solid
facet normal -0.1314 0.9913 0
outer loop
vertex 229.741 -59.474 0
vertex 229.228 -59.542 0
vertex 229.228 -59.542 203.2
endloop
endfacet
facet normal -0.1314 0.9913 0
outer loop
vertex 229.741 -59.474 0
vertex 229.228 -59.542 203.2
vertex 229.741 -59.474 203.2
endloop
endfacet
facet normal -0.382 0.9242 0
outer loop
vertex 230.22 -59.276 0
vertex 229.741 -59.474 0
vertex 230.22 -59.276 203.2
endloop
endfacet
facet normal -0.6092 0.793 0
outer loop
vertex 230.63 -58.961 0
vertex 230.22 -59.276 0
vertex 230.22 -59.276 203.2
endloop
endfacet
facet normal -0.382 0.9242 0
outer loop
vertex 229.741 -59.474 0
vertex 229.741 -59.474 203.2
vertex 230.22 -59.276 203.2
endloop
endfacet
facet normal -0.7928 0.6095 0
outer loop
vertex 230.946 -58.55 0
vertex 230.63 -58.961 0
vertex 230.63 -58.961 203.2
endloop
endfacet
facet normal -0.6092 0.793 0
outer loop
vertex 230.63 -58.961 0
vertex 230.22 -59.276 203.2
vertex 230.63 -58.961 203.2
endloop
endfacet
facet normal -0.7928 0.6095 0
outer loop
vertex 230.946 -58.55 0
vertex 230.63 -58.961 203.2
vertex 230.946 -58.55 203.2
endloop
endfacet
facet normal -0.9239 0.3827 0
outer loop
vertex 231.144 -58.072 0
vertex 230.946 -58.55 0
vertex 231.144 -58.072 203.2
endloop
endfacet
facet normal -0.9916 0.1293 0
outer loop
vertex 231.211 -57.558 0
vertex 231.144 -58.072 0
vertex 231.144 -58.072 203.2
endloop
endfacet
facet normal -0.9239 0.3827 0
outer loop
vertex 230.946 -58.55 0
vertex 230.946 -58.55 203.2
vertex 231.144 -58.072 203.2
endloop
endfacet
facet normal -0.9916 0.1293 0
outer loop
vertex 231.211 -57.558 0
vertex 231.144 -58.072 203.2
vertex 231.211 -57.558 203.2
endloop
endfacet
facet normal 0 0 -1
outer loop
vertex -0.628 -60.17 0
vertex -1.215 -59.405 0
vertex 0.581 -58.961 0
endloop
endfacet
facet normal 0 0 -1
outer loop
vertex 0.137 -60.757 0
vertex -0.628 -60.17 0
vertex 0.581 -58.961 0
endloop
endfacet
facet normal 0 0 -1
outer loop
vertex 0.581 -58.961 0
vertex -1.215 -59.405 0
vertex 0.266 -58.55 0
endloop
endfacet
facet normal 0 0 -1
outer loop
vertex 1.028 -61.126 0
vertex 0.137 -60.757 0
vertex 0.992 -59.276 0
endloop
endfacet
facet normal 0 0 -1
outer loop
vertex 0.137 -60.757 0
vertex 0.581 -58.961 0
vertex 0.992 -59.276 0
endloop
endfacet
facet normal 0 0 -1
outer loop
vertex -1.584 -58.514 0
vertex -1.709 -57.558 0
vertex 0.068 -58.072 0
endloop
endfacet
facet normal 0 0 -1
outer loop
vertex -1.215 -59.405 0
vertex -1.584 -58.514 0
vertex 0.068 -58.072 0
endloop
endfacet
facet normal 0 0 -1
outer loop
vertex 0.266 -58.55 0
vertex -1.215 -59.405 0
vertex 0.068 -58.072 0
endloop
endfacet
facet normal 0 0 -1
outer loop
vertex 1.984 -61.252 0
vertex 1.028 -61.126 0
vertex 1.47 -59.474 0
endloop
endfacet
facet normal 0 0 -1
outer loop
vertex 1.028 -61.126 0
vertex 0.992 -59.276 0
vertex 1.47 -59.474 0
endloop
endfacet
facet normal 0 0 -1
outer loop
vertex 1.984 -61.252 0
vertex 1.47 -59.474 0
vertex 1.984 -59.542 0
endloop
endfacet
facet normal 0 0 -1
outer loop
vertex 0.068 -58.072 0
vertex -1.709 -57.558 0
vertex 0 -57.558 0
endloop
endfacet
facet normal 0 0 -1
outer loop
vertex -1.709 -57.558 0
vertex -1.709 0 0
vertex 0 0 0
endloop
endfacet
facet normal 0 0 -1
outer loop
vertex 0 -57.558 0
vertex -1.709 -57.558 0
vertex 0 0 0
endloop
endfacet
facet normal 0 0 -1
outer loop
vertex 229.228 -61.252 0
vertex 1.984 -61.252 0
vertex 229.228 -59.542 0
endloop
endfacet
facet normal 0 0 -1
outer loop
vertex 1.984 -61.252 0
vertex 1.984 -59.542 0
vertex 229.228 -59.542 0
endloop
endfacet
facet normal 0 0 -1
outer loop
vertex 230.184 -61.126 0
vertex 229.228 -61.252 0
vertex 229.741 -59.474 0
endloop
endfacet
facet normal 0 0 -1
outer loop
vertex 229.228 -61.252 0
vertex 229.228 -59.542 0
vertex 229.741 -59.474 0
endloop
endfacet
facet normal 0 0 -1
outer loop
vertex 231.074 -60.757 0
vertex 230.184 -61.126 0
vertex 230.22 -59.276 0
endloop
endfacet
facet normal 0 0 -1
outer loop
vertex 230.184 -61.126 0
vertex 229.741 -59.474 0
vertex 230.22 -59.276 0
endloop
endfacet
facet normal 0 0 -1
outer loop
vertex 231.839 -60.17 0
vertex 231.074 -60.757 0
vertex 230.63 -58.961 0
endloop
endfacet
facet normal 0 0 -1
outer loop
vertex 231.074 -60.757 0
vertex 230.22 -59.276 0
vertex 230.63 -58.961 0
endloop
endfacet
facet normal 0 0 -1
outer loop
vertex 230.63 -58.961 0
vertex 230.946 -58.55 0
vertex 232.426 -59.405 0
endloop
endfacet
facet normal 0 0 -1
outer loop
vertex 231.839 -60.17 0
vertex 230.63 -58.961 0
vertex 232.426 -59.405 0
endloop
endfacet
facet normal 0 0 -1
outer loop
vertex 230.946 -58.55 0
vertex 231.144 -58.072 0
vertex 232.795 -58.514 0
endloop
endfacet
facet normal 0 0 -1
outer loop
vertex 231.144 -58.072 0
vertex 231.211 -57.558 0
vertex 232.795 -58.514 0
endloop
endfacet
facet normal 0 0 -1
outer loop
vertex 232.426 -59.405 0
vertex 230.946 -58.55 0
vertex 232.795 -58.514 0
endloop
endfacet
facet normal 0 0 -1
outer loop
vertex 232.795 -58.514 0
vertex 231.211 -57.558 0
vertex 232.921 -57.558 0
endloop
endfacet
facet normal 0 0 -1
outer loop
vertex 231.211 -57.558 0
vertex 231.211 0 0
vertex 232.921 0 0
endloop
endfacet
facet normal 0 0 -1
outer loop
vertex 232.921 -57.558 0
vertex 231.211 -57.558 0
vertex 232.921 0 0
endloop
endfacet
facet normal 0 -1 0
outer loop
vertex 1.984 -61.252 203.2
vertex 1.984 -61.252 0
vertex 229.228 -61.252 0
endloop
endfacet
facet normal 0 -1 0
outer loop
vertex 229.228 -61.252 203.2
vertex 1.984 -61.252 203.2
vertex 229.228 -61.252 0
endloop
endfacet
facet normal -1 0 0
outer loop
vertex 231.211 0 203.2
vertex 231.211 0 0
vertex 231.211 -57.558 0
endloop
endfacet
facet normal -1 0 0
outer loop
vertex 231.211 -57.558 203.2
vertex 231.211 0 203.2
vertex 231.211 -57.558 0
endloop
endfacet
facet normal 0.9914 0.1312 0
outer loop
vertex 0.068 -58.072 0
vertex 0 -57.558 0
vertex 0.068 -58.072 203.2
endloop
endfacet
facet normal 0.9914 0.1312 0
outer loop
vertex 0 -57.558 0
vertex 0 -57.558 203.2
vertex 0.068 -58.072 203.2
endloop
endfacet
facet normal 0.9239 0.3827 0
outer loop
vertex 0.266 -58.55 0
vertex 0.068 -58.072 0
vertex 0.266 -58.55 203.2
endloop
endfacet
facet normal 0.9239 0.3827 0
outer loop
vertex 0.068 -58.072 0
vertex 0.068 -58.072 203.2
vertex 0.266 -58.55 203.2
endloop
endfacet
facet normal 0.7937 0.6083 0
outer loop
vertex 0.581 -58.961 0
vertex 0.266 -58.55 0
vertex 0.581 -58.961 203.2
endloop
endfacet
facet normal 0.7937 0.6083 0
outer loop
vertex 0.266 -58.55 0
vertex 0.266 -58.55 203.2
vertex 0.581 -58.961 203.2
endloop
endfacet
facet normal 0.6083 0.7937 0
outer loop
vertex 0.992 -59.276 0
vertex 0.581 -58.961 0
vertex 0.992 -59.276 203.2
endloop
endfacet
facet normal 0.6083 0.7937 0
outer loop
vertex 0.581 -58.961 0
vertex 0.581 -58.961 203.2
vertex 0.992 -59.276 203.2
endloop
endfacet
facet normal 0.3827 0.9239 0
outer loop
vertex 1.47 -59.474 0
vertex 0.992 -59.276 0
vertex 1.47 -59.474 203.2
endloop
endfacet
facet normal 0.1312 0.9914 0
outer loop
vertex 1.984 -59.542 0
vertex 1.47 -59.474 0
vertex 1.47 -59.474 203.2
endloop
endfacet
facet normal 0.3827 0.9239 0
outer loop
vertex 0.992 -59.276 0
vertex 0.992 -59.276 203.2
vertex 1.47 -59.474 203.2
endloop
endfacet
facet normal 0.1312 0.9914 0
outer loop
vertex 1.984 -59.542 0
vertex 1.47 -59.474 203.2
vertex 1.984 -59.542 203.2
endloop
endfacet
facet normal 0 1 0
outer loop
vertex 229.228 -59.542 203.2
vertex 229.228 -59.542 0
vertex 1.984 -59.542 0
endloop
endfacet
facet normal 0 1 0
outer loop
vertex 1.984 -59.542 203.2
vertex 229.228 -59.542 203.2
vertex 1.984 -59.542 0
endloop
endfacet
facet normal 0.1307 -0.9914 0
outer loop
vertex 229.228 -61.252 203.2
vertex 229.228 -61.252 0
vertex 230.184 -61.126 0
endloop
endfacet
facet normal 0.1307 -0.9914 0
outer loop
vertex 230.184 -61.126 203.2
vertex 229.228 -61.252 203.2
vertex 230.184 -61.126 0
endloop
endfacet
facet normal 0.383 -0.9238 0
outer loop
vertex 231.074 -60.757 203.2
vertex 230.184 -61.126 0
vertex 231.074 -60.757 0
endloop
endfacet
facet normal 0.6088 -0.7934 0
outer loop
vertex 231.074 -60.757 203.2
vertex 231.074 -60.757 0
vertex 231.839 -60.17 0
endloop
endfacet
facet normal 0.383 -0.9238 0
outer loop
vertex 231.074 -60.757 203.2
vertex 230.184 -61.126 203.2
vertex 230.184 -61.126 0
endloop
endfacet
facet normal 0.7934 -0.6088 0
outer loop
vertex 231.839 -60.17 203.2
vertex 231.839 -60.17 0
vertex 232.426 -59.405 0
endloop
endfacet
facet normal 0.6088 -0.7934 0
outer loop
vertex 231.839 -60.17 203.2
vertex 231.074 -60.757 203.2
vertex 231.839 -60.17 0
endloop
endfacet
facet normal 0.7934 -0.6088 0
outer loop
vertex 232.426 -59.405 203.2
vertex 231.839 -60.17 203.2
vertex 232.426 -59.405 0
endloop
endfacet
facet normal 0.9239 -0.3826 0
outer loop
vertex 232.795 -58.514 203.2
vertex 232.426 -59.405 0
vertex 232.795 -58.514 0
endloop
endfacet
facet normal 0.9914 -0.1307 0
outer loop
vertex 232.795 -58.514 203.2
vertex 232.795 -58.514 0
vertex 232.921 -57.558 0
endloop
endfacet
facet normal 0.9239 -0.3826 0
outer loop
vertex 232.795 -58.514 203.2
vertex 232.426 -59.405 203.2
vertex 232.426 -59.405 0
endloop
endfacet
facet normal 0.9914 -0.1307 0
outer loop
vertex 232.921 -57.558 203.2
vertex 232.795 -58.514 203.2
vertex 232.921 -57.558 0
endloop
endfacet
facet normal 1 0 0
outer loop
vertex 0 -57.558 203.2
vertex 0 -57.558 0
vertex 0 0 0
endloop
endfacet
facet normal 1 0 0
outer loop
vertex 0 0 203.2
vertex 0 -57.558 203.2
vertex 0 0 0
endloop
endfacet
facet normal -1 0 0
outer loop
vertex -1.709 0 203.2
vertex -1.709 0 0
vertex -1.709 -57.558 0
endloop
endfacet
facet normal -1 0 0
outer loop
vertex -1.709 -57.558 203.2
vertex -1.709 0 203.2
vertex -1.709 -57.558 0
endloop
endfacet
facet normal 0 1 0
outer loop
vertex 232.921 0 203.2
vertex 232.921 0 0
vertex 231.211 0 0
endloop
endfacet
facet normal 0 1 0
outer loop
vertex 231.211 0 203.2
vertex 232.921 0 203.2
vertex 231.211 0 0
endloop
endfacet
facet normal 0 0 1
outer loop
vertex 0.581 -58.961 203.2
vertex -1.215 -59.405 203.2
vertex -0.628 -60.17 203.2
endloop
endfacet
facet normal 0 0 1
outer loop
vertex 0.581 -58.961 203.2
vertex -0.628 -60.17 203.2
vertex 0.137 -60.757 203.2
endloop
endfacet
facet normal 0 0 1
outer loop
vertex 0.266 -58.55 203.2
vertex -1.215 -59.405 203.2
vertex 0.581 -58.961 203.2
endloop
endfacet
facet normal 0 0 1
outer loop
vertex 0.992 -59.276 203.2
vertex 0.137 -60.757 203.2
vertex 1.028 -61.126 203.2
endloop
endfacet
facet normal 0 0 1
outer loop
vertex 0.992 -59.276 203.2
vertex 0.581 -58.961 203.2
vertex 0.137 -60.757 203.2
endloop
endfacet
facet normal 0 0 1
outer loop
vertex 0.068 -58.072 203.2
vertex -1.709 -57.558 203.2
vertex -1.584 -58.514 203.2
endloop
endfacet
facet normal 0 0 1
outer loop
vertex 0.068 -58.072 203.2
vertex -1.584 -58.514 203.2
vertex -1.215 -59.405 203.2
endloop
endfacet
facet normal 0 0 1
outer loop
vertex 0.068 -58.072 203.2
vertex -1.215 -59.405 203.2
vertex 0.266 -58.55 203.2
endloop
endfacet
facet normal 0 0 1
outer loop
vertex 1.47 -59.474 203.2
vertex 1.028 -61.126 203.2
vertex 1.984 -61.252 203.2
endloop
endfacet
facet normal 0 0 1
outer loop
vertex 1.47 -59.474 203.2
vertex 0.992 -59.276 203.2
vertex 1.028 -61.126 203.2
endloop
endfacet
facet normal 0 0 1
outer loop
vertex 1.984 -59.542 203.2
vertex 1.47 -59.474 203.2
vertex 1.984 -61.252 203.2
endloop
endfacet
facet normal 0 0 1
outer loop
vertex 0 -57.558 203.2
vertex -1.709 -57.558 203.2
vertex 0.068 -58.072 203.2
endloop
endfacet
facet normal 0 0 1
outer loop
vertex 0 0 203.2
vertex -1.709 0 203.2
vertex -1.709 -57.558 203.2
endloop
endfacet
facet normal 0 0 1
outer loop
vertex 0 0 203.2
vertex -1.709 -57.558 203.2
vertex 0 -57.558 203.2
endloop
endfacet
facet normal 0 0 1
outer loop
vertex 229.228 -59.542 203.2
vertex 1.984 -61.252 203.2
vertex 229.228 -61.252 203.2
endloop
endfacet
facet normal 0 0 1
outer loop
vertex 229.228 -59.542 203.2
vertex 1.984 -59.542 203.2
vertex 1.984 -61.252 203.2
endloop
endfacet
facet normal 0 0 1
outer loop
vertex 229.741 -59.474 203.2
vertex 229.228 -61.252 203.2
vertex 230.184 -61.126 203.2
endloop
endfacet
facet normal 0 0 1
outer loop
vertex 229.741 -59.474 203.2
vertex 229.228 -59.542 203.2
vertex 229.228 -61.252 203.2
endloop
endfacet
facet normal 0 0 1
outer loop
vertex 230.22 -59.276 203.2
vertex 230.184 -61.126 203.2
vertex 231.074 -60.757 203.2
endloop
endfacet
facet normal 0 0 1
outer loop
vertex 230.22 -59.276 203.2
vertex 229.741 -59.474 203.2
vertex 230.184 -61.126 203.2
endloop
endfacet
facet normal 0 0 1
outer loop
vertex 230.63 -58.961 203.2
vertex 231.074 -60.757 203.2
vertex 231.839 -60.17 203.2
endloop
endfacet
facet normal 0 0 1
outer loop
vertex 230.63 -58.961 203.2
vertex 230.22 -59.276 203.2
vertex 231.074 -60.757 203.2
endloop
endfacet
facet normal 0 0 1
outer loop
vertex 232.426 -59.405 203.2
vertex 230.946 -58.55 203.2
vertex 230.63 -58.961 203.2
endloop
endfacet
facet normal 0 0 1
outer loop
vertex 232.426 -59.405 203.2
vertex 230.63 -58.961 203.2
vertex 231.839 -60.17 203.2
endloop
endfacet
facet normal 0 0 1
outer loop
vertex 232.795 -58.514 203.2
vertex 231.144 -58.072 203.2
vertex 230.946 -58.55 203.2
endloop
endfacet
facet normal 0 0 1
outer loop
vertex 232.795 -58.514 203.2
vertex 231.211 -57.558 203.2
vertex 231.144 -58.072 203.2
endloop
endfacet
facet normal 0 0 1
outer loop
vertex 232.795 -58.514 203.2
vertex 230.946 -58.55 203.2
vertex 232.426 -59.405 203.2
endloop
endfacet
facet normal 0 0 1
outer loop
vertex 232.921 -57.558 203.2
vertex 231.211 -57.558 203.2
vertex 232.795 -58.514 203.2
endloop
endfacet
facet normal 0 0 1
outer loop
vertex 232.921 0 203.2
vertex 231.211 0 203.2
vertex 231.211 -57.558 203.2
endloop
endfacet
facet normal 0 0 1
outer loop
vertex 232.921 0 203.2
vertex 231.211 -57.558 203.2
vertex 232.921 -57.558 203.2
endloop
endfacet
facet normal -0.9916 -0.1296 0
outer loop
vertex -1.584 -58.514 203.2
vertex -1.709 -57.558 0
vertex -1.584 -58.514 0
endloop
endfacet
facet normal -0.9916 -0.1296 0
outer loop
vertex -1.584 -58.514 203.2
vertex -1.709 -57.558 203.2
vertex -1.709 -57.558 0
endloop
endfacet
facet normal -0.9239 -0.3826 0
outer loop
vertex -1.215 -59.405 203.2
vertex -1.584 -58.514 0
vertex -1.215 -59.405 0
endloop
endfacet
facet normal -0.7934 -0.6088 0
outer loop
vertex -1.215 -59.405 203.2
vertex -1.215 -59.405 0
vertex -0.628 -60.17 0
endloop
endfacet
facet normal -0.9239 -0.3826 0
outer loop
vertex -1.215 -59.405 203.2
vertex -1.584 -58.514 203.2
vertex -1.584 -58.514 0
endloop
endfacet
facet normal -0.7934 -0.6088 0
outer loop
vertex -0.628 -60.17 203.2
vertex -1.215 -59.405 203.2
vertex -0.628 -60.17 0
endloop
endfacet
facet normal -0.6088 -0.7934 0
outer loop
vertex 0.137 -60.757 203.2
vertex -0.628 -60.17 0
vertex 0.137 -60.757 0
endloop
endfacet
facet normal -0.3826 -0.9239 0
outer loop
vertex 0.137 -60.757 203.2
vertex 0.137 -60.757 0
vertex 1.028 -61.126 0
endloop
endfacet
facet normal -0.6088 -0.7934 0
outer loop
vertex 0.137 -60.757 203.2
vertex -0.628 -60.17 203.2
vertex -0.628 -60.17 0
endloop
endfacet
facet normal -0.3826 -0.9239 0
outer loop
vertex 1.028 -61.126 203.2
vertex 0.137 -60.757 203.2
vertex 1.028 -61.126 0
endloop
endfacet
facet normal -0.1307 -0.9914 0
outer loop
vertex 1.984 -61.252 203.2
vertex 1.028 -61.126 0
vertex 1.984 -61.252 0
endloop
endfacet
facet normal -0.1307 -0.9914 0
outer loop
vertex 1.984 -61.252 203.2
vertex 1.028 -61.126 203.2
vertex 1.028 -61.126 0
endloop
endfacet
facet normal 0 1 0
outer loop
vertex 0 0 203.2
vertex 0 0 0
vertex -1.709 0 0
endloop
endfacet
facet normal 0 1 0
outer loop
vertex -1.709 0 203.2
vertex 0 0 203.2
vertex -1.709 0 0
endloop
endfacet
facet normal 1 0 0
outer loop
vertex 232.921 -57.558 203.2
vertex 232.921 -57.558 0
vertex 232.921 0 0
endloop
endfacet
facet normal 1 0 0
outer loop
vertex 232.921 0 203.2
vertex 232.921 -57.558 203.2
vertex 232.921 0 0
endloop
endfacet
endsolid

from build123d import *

# Parameters (mm, degrees)
F1_DEPTH = 203.2
F2_R     = 3.69316
F3_R     = 1.98374


with BuildPart() as f1:
    # F0 (on Top) → F1 (new body)
    with BuildSketch(Plane.XY):
        Polygon((0, -59.54209), (0, 0), (-1.70942, 0), (-1.70942, -61.25151), (232.920897, -61.25151), (232.920897, 0), (231.211477, 0), (231.211477, -59.54209), align=None)
    extrude(amount=F1_DEPTH)

    # F2
    f2_edges = [f1.edges().sort_by_distance(p)[0] for p in [
        (232.920897, -61.25151, 101.6),
        (-1.70942, -61.25151, 101.6),
    ]]
    fillet(f2_edges, radius=F2_R)

    # F3
    f3_edges = [f1.edges().sort_by_distance(p)[0] for p in [
        (0, -59.54209, 101.6),
        (231.211477, -59.54209, 101.6),
    ]]
    fillet(f3_edges, radius=F3_R)


solid = f1.part
